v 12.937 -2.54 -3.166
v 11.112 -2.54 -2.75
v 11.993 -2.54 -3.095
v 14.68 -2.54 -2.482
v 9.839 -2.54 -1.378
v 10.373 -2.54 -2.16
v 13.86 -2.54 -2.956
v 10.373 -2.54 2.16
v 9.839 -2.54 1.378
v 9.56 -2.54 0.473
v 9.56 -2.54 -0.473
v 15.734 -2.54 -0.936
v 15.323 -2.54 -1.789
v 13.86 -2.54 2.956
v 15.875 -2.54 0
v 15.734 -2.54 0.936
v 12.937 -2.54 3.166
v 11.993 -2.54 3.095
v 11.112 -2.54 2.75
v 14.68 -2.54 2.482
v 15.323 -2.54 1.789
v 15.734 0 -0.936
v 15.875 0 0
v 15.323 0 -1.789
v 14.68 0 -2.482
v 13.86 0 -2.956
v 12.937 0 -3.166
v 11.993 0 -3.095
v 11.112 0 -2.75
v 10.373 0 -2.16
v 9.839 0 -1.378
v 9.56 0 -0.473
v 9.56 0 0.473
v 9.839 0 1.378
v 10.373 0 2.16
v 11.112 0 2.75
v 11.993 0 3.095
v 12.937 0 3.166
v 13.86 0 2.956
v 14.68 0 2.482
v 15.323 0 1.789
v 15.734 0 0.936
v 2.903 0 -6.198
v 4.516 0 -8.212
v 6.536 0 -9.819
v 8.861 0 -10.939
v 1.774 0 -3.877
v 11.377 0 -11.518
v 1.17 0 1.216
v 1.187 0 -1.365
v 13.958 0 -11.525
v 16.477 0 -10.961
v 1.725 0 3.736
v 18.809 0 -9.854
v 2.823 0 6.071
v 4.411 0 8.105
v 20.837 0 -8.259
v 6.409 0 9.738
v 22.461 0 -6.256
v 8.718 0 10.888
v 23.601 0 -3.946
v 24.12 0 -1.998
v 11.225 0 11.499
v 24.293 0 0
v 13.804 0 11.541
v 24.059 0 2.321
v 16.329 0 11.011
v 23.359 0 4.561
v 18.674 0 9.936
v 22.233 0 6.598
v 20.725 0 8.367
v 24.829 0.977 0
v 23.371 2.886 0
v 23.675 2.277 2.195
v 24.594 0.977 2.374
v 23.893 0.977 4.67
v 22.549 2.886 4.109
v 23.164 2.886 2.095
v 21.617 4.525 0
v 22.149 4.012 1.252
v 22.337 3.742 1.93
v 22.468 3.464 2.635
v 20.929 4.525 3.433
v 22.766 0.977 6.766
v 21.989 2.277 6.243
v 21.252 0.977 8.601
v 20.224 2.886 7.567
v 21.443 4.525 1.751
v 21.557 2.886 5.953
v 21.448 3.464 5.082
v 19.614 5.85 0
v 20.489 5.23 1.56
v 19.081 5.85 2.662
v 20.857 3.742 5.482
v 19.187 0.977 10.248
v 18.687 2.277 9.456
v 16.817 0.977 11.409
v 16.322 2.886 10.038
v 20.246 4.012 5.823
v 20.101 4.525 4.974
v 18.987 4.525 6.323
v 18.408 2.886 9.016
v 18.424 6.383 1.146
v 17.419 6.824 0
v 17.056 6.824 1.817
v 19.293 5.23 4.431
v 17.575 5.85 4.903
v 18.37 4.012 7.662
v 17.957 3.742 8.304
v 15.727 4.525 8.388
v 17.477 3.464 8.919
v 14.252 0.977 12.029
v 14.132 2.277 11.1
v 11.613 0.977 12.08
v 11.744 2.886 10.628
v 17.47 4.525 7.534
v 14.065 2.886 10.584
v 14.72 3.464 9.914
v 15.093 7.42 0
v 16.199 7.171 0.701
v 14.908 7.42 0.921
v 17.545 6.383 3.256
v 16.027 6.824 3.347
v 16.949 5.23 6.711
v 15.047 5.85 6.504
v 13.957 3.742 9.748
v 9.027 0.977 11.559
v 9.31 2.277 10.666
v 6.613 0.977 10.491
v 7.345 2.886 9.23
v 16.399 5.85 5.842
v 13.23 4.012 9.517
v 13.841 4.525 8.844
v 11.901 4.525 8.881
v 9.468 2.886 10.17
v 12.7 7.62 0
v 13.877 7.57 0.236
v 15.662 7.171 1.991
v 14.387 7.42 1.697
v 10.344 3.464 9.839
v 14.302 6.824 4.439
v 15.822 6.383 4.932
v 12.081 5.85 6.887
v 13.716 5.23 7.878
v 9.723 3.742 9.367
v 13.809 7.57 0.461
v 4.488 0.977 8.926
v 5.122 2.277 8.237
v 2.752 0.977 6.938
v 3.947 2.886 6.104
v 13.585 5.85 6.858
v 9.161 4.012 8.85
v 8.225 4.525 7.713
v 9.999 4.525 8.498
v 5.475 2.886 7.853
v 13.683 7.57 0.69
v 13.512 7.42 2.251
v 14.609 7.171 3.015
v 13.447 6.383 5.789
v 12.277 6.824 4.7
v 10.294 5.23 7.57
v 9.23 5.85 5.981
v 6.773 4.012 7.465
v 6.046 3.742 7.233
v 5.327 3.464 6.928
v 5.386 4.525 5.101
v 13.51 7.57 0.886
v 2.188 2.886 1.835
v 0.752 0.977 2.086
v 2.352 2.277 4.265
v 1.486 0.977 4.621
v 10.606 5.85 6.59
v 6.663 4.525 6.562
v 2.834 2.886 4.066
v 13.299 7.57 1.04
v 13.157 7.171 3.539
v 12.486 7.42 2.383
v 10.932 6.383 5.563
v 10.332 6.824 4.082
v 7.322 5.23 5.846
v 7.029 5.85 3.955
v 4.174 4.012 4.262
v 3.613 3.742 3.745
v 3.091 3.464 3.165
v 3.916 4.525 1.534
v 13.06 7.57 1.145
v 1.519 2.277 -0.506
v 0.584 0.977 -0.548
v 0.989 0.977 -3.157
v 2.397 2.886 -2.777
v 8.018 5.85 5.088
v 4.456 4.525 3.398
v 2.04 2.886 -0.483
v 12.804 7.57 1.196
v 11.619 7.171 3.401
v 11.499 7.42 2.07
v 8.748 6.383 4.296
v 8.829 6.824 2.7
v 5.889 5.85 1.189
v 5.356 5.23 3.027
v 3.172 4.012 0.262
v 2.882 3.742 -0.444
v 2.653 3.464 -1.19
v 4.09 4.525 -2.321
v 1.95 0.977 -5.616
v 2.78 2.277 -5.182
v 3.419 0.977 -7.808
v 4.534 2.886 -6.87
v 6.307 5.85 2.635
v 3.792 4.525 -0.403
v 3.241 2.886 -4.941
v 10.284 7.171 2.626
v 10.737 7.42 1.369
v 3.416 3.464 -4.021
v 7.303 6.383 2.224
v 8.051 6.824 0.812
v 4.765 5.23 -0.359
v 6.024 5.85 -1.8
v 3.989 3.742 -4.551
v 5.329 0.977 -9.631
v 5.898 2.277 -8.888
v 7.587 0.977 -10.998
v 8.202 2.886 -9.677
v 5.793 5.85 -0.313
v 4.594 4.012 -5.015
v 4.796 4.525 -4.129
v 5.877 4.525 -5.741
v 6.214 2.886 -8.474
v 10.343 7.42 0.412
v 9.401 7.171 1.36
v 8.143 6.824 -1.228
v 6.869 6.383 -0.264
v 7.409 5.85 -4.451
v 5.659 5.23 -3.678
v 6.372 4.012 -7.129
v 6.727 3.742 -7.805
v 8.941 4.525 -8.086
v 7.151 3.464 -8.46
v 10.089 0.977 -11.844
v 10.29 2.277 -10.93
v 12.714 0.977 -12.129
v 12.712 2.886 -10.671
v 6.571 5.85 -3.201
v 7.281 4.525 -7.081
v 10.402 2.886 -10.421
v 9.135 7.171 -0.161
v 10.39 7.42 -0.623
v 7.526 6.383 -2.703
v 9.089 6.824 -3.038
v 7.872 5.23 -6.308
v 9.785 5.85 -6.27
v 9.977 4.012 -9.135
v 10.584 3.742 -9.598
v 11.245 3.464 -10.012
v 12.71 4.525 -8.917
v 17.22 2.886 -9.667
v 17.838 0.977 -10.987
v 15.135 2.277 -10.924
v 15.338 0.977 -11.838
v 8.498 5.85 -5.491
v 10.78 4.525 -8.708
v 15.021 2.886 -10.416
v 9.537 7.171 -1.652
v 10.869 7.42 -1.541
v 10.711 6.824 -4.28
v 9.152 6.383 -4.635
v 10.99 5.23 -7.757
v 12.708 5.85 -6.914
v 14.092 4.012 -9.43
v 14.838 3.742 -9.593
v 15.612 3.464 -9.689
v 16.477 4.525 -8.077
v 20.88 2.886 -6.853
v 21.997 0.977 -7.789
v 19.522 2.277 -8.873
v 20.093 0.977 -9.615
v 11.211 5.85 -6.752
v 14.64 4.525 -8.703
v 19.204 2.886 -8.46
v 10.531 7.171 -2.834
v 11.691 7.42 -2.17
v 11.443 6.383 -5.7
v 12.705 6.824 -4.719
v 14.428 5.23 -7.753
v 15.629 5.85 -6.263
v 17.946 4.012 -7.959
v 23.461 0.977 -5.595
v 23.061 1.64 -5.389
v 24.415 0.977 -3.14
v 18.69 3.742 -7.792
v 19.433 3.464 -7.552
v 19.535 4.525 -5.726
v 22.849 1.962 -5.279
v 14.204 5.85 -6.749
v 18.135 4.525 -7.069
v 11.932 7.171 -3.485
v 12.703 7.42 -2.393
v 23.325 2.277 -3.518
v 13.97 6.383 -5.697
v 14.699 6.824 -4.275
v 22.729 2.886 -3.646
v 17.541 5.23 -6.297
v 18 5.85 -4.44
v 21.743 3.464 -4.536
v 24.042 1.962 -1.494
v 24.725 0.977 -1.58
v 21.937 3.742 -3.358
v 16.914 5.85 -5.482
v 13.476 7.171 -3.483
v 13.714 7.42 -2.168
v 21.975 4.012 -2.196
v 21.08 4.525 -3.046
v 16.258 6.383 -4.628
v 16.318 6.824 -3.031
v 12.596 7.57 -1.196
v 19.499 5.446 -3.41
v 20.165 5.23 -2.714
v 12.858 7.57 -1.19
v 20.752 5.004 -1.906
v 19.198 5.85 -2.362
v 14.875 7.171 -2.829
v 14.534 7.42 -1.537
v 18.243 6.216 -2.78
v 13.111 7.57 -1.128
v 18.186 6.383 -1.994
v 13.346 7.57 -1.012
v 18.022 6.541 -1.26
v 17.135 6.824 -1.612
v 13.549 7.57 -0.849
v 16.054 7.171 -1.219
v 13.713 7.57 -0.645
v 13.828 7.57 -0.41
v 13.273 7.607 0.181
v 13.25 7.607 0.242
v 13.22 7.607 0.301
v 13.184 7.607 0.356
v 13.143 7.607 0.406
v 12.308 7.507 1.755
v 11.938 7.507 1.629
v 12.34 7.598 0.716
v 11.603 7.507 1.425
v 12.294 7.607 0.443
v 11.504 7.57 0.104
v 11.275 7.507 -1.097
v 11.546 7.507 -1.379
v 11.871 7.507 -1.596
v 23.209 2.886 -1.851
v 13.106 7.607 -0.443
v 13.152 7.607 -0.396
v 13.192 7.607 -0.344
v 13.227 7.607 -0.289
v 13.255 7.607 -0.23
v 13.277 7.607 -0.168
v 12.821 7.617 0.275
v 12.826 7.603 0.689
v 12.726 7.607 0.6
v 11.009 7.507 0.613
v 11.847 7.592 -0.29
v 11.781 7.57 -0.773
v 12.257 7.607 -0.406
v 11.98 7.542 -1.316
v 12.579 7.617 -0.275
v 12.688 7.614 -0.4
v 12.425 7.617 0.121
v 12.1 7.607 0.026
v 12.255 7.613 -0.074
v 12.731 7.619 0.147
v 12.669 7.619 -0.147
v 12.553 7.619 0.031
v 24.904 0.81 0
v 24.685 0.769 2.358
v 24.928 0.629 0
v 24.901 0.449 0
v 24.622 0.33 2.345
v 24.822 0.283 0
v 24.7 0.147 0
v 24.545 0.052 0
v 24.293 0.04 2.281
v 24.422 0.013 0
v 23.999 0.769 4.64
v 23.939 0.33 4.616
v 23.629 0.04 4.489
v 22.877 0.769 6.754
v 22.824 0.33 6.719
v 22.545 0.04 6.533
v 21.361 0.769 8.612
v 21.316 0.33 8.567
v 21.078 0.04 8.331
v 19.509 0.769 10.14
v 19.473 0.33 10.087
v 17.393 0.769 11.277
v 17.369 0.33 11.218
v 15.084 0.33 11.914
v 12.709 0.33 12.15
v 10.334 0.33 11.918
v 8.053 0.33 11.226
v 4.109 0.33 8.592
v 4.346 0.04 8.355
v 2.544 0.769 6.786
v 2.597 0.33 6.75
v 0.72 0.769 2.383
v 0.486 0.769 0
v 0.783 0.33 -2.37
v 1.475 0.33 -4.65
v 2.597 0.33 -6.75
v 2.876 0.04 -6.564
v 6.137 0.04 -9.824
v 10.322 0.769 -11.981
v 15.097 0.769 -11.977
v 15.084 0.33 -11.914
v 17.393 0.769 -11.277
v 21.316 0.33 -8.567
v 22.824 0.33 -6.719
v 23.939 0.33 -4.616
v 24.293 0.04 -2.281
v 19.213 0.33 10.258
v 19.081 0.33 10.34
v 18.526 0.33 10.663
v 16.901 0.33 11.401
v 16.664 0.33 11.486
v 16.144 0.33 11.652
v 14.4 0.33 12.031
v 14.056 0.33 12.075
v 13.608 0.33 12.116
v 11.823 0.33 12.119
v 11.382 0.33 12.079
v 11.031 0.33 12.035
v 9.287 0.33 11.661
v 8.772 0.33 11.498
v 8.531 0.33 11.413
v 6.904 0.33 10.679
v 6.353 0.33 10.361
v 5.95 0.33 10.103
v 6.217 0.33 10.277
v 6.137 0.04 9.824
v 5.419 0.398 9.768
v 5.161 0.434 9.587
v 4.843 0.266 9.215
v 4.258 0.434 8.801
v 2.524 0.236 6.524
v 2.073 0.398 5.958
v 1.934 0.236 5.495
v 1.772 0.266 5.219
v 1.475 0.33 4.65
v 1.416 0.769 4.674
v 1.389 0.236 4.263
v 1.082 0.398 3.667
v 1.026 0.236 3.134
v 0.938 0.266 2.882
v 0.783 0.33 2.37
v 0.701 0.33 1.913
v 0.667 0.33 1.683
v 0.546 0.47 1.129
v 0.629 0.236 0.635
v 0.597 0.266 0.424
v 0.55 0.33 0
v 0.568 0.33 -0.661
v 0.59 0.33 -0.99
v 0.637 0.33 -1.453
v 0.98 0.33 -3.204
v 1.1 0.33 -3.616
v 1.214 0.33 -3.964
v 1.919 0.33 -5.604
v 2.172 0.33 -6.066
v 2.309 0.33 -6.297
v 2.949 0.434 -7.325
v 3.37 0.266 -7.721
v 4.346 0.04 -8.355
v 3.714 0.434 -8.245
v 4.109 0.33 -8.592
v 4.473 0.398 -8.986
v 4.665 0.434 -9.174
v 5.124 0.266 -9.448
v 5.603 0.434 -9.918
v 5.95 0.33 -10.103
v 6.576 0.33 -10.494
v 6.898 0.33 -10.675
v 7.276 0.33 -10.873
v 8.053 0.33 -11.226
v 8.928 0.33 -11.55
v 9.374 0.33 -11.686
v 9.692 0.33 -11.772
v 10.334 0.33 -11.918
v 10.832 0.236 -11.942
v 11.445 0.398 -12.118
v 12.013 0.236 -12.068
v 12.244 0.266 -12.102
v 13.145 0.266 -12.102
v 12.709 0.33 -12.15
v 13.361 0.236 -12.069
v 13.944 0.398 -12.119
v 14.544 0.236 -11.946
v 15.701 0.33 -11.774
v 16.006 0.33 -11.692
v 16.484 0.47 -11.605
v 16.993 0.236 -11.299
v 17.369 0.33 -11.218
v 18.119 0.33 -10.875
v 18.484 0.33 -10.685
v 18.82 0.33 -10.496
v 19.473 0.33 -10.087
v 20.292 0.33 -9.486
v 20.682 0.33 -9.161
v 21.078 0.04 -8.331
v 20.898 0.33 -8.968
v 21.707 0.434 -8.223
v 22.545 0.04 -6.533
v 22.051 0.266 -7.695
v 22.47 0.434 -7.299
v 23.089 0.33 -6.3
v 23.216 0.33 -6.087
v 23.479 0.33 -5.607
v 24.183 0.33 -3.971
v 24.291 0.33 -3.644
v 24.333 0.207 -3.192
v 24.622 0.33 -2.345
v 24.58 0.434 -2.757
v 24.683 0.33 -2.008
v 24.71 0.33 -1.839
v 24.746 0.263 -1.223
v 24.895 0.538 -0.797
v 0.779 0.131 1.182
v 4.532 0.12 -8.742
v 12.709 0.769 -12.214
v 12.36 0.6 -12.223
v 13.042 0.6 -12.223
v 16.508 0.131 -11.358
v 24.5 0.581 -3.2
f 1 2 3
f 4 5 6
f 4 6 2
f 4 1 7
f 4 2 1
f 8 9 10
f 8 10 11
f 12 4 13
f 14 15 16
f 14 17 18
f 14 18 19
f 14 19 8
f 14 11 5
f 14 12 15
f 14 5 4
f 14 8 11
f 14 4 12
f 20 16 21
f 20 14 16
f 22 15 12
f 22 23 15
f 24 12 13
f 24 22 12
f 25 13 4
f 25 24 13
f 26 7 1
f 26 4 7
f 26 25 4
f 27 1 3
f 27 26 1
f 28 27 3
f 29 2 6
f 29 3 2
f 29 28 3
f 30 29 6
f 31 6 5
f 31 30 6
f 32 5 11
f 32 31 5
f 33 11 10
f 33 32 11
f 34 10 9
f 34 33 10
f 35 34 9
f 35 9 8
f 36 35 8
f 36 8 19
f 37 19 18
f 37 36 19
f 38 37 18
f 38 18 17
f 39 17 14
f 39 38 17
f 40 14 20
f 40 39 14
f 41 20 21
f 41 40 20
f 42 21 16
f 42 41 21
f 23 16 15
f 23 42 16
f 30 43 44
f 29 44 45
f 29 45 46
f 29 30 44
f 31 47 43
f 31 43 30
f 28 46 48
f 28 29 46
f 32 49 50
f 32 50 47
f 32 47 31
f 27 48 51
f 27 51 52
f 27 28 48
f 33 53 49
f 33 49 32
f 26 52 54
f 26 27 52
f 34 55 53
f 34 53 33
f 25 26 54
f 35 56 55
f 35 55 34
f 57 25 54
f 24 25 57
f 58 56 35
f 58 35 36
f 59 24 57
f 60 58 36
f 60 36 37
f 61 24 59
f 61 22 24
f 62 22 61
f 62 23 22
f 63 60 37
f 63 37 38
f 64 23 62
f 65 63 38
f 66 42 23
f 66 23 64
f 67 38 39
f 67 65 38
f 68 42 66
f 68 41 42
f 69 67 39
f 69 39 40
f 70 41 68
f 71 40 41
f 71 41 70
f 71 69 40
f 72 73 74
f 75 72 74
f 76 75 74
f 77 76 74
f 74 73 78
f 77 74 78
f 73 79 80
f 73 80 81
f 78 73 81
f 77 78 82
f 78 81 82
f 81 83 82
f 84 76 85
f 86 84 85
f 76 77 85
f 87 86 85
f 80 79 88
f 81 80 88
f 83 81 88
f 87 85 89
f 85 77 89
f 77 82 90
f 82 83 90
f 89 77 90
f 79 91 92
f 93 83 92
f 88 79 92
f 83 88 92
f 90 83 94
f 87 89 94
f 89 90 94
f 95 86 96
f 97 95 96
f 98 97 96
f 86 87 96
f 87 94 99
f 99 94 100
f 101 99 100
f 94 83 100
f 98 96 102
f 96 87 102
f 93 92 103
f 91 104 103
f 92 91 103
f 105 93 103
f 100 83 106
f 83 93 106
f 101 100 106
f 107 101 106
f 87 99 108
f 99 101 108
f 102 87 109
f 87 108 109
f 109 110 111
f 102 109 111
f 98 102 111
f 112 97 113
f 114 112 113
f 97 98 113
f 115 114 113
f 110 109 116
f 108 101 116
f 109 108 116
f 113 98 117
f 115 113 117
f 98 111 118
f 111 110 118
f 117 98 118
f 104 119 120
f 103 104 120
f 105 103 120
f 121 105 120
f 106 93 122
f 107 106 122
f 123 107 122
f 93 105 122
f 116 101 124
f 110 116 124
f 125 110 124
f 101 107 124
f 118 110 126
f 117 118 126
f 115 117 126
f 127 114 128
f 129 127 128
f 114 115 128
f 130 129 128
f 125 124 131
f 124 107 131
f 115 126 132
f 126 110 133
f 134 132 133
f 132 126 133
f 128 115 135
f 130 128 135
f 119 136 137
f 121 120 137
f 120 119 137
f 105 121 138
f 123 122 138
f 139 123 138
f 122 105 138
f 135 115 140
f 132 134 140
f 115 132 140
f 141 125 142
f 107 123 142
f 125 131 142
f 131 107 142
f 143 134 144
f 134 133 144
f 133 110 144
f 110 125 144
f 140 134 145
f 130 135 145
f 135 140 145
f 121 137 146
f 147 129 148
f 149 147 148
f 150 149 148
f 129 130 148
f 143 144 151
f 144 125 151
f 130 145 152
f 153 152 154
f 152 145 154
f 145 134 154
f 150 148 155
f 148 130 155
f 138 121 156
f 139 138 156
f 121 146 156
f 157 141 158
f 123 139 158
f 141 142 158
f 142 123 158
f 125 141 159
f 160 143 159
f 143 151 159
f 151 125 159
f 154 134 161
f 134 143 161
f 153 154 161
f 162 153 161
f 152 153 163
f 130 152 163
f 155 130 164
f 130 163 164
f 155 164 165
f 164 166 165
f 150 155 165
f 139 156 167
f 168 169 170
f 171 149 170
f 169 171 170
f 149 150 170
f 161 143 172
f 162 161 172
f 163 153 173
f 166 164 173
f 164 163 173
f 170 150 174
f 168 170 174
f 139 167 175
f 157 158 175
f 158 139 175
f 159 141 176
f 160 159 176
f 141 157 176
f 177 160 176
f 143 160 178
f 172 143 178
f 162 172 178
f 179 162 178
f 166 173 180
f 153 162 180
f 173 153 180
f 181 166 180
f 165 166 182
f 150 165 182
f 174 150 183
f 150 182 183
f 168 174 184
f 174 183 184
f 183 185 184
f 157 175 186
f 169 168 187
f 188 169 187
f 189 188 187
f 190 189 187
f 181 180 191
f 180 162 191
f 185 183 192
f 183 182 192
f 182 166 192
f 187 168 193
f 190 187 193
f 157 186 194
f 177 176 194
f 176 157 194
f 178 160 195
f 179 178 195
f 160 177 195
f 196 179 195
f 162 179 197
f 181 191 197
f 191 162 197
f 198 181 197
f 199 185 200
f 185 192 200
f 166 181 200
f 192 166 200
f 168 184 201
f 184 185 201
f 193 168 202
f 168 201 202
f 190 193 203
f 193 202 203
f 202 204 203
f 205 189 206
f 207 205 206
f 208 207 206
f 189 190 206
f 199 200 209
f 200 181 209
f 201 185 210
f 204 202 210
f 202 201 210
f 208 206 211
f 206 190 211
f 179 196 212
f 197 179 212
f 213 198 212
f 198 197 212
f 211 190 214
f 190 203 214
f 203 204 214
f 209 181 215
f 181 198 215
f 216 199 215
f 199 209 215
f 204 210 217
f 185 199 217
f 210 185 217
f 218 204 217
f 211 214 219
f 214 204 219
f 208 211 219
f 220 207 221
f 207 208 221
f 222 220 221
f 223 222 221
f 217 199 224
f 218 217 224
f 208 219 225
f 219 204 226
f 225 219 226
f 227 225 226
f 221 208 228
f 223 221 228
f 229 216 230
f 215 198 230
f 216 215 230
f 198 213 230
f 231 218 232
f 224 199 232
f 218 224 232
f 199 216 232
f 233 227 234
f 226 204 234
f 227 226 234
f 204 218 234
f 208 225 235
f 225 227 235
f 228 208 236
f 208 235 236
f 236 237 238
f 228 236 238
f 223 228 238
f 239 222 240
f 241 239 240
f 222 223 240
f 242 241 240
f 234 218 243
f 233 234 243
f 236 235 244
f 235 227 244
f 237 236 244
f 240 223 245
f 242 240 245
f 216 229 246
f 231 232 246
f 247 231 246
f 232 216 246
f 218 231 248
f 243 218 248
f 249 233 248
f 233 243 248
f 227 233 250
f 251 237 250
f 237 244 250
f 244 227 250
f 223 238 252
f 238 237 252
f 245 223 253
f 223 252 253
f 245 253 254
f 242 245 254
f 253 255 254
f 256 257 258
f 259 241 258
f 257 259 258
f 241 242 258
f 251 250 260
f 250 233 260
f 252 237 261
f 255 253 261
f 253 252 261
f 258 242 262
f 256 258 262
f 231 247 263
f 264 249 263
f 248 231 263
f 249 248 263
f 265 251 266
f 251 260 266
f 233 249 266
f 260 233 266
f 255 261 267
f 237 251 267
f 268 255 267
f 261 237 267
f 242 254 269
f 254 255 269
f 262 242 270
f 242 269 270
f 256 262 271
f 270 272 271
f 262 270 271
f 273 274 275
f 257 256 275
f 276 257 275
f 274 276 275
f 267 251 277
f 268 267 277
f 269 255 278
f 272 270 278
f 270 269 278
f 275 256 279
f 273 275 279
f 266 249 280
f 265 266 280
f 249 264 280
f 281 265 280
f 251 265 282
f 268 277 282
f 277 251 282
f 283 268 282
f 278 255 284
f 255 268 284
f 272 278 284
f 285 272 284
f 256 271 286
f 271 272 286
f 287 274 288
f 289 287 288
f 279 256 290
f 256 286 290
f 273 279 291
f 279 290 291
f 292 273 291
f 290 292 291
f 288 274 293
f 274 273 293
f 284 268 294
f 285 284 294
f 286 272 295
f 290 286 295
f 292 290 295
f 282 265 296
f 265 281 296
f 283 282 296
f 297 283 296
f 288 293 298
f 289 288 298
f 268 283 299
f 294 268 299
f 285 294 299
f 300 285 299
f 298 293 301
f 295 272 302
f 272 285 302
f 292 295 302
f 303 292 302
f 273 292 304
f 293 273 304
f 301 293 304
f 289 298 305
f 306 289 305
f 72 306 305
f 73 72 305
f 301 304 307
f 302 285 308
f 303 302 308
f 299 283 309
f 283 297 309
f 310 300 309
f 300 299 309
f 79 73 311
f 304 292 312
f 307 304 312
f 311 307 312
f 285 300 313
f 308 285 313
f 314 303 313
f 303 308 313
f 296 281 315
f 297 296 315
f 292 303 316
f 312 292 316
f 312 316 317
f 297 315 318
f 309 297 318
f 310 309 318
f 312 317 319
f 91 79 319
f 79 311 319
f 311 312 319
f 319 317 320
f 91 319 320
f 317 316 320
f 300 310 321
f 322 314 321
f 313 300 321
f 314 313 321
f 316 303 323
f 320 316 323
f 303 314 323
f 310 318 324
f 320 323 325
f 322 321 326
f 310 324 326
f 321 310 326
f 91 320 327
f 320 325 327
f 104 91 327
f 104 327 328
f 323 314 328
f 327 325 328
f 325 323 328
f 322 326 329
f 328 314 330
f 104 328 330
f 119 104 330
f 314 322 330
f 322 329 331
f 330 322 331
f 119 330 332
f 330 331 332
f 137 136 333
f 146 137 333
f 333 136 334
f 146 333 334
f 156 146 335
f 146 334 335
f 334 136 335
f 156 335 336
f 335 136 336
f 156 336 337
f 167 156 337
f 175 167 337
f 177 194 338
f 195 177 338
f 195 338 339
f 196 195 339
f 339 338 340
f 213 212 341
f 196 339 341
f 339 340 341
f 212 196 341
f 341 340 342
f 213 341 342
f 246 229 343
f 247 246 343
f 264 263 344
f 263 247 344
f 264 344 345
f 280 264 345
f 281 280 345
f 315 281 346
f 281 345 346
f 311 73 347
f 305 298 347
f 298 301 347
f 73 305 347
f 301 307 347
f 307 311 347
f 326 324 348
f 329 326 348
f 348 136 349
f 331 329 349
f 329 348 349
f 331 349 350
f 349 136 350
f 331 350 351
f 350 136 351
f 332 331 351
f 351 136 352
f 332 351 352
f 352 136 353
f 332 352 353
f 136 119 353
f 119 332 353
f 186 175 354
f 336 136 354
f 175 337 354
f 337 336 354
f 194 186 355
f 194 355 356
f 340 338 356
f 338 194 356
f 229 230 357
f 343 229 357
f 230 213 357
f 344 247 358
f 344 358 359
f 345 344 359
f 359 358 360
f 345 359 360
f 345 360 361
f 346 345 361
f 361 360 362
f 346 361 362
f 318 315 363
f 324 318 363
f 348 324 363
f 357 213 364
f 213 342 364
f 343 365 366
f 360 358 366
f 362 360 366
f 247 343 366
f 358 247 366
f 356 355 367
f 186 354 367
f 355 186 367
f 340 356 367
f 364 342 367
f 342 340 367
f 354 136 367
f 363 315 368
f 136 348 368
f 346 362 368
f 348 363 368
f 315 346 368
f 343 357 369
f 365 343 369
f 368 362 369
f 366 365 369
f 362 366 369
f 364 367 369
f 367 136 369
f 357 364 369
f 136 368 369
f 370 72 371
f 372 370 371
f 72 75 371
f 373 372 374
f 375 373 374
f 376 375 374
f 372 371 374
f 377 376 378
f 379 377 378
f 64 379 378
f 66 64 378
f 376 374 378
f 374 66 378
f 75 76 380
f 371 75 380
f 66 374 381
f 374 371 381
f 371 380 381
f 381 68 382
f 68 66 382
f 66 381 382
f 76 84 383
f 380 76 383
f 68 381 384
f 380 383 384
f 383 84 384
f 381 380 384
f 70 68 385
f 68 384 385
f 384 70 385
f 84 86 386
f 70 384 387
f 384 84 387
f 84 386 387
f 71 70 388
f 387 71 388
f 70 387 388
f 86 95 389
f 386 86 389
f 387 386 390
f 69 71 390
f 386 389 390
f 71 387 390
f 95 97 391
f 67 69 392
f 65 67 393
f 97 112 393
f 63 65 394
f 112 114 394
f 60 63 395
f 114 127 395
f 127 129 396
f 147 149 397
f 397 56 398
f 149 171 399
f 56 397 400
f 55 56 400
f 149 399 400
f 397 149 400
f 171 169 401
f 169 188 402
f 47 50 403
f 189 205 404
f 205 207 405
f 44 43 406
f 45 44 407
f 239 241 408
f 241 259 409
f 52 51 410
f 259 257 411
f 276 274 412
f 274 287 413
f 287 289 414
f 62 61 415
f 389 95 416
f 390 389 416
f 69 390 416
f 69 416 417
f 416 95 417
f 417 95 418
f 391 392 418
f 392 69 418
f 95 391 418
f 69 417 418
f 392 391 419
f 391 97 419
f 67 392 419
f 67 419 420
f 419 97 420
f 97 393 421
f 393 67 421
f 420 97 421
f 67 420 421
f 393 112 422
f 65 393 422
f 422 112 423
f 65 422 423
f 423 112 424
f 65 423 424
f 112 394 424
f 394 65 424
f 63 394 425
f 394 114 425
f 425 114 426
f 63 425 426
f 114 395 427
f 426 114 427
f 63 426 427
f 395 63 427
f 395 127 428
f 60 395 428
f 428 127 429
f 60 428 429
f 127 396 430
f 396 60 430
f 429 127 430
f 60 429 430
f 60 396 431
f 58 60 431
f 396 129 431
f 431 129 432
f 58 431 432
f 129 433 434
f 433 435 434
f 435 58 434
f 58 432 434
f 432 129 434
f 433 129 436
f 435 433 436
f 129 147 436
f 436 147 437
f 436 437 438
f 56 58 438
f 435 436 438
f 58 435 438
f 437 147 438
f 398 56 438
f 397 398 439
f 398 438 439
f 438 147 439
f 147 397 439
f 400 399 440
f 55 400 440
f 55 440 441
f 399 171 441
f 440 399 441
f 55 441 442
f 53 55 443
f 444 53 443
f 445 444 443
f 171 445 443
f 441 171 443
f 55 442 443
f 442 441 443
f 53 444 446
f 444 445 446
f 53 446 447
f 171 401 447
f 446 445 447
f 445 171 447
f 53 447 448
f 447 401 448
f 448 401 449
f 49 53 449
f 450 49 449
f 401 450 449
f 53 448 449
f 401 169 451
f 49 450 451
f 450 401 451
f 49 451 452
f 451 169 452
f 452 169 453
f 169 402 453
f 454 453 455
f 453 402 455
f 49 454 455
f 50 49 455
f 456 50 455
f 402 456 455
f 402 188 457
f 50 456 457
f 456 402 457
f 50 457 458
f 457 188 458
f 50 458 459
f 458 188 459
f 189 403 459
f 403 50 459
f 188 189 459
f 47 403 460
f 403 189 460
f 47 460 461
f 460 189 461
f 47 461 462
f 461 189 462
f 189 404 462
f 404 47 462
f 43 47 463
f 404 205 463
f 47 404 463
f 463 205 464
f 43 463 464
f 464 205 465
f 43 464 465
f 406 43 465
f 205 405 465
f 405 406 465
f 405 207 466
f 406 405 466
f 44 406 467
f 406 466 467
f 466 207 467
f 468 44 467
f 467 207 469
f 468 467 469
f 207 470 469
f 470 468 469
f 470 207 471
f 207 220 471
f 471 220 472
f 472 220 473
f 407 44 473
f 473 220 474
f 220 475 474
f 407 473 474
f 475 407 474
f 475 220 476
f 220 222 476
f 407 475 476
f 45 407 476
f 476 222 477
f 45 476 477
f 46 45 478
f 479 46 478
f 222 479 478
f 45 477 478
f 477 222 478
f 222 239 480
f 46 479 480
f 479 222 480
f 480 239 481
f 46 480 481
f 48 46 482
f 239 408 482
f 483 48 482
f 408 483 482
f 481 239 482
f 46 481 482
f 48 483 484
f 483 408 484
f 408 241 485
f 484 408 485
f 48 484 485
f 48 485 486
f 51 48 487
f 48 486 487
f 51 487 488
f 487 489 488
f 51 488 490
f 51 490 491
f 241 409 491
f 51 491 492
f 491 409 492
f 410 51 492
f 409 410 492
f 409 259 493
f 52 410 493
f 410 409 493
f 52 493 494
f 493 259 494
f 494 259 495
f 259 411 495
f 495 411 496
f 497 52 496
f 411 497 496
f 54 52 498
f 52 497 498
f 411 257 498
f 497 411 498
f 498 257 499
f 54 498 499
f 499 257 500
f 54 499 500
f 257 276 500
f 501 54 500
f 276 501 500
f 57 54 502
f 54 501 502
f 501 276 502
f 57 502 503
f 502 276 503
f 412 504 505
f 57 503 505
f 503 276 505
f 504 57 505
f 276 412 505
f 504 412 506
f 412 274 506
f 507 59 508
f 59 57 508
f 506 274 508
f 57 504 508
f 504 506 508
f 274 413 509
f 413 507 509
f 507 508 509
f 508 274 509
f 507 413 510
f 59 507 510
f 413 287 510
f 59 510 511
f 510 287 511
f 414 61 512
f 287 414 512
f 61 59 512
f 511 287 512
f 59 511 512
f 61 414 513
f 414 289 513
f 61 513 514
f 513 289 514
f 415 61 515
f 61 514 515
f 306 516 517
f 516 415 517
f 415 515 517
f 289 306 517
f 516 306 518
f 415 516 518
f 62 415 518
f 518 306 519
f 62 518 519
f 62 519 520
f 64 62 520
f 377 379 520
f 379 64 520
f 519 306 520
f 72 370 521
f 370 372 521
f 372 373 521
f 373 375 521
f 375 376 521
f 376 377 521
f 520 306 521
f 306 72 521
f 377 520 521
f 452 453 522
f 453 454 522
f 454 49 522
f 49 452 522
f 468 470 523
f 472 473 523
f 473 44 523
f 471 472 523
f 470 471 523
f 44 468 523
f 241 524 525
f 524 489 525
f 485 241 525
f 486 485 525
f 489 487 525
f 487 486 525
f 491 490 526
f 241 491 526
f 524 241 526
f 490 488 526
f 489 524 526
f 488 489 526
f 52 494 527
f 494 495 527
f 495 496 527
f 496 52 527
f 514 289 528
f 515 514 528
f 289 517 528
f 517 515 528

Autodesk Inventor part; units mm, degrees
ref_plane "YZ Plane" through (0, 0, 0) normal (1, 0, 0) x (0, 1, 0)
ref_plane "XZ Plane" through (0, 0, 0) normal (0, 1, 0) x (-1, 0, 0)
ref_plane "XY Plane" through (0, 0, 0) normal (0, 0, 1) x (1, 0, 0)
sketch "Sketch1" plane through (0, 0, 0) normal (0, 0, 1) x (1, 0, 0)
  line L0 (0, 0) -> (25.4, 0)
  arc A0 (12.7, 7.62) -> (0, 0) centre (12.7, -6.7733) ccw
  arc A1 (25.4, 0) -> (12.7, 7.62) centre (12.7, -6.7733) ccw
  line L1 (12.7, 7.62) -> (4.6641, 7.62)
  line L2 (12.7, 7.62) -> (12.7, 0)
  dimension "d0" = 25.4
  dimension "d1" = 7.62
  dimension "d2" = 12.7
revolve "Revolution1" add sketch "Sketch1" angle 360 about axis through (12.7, 7.62, 0) along (0, -1, 0) contours L2 A1 L0
fillet "Fillet1" radius 0.635 1 edges at (0, 0, 0)
sketch "Sketch2" plane through (12.7, 0, 0) normal (0, -1, 0) x (1, 0, 0)
  circle A0 centre (0, 0) radius 3.175
  circle A1 centre (0, 0) radius 11.5935 projected
  point P0 (-12.7, 0)
  dimension "d5" = 6.35
  dimension "d6" = 0
extrude "Extrusion1" add sketch "Sketch2" along normal blind 2.54 contours A0
properties part number "Button"
